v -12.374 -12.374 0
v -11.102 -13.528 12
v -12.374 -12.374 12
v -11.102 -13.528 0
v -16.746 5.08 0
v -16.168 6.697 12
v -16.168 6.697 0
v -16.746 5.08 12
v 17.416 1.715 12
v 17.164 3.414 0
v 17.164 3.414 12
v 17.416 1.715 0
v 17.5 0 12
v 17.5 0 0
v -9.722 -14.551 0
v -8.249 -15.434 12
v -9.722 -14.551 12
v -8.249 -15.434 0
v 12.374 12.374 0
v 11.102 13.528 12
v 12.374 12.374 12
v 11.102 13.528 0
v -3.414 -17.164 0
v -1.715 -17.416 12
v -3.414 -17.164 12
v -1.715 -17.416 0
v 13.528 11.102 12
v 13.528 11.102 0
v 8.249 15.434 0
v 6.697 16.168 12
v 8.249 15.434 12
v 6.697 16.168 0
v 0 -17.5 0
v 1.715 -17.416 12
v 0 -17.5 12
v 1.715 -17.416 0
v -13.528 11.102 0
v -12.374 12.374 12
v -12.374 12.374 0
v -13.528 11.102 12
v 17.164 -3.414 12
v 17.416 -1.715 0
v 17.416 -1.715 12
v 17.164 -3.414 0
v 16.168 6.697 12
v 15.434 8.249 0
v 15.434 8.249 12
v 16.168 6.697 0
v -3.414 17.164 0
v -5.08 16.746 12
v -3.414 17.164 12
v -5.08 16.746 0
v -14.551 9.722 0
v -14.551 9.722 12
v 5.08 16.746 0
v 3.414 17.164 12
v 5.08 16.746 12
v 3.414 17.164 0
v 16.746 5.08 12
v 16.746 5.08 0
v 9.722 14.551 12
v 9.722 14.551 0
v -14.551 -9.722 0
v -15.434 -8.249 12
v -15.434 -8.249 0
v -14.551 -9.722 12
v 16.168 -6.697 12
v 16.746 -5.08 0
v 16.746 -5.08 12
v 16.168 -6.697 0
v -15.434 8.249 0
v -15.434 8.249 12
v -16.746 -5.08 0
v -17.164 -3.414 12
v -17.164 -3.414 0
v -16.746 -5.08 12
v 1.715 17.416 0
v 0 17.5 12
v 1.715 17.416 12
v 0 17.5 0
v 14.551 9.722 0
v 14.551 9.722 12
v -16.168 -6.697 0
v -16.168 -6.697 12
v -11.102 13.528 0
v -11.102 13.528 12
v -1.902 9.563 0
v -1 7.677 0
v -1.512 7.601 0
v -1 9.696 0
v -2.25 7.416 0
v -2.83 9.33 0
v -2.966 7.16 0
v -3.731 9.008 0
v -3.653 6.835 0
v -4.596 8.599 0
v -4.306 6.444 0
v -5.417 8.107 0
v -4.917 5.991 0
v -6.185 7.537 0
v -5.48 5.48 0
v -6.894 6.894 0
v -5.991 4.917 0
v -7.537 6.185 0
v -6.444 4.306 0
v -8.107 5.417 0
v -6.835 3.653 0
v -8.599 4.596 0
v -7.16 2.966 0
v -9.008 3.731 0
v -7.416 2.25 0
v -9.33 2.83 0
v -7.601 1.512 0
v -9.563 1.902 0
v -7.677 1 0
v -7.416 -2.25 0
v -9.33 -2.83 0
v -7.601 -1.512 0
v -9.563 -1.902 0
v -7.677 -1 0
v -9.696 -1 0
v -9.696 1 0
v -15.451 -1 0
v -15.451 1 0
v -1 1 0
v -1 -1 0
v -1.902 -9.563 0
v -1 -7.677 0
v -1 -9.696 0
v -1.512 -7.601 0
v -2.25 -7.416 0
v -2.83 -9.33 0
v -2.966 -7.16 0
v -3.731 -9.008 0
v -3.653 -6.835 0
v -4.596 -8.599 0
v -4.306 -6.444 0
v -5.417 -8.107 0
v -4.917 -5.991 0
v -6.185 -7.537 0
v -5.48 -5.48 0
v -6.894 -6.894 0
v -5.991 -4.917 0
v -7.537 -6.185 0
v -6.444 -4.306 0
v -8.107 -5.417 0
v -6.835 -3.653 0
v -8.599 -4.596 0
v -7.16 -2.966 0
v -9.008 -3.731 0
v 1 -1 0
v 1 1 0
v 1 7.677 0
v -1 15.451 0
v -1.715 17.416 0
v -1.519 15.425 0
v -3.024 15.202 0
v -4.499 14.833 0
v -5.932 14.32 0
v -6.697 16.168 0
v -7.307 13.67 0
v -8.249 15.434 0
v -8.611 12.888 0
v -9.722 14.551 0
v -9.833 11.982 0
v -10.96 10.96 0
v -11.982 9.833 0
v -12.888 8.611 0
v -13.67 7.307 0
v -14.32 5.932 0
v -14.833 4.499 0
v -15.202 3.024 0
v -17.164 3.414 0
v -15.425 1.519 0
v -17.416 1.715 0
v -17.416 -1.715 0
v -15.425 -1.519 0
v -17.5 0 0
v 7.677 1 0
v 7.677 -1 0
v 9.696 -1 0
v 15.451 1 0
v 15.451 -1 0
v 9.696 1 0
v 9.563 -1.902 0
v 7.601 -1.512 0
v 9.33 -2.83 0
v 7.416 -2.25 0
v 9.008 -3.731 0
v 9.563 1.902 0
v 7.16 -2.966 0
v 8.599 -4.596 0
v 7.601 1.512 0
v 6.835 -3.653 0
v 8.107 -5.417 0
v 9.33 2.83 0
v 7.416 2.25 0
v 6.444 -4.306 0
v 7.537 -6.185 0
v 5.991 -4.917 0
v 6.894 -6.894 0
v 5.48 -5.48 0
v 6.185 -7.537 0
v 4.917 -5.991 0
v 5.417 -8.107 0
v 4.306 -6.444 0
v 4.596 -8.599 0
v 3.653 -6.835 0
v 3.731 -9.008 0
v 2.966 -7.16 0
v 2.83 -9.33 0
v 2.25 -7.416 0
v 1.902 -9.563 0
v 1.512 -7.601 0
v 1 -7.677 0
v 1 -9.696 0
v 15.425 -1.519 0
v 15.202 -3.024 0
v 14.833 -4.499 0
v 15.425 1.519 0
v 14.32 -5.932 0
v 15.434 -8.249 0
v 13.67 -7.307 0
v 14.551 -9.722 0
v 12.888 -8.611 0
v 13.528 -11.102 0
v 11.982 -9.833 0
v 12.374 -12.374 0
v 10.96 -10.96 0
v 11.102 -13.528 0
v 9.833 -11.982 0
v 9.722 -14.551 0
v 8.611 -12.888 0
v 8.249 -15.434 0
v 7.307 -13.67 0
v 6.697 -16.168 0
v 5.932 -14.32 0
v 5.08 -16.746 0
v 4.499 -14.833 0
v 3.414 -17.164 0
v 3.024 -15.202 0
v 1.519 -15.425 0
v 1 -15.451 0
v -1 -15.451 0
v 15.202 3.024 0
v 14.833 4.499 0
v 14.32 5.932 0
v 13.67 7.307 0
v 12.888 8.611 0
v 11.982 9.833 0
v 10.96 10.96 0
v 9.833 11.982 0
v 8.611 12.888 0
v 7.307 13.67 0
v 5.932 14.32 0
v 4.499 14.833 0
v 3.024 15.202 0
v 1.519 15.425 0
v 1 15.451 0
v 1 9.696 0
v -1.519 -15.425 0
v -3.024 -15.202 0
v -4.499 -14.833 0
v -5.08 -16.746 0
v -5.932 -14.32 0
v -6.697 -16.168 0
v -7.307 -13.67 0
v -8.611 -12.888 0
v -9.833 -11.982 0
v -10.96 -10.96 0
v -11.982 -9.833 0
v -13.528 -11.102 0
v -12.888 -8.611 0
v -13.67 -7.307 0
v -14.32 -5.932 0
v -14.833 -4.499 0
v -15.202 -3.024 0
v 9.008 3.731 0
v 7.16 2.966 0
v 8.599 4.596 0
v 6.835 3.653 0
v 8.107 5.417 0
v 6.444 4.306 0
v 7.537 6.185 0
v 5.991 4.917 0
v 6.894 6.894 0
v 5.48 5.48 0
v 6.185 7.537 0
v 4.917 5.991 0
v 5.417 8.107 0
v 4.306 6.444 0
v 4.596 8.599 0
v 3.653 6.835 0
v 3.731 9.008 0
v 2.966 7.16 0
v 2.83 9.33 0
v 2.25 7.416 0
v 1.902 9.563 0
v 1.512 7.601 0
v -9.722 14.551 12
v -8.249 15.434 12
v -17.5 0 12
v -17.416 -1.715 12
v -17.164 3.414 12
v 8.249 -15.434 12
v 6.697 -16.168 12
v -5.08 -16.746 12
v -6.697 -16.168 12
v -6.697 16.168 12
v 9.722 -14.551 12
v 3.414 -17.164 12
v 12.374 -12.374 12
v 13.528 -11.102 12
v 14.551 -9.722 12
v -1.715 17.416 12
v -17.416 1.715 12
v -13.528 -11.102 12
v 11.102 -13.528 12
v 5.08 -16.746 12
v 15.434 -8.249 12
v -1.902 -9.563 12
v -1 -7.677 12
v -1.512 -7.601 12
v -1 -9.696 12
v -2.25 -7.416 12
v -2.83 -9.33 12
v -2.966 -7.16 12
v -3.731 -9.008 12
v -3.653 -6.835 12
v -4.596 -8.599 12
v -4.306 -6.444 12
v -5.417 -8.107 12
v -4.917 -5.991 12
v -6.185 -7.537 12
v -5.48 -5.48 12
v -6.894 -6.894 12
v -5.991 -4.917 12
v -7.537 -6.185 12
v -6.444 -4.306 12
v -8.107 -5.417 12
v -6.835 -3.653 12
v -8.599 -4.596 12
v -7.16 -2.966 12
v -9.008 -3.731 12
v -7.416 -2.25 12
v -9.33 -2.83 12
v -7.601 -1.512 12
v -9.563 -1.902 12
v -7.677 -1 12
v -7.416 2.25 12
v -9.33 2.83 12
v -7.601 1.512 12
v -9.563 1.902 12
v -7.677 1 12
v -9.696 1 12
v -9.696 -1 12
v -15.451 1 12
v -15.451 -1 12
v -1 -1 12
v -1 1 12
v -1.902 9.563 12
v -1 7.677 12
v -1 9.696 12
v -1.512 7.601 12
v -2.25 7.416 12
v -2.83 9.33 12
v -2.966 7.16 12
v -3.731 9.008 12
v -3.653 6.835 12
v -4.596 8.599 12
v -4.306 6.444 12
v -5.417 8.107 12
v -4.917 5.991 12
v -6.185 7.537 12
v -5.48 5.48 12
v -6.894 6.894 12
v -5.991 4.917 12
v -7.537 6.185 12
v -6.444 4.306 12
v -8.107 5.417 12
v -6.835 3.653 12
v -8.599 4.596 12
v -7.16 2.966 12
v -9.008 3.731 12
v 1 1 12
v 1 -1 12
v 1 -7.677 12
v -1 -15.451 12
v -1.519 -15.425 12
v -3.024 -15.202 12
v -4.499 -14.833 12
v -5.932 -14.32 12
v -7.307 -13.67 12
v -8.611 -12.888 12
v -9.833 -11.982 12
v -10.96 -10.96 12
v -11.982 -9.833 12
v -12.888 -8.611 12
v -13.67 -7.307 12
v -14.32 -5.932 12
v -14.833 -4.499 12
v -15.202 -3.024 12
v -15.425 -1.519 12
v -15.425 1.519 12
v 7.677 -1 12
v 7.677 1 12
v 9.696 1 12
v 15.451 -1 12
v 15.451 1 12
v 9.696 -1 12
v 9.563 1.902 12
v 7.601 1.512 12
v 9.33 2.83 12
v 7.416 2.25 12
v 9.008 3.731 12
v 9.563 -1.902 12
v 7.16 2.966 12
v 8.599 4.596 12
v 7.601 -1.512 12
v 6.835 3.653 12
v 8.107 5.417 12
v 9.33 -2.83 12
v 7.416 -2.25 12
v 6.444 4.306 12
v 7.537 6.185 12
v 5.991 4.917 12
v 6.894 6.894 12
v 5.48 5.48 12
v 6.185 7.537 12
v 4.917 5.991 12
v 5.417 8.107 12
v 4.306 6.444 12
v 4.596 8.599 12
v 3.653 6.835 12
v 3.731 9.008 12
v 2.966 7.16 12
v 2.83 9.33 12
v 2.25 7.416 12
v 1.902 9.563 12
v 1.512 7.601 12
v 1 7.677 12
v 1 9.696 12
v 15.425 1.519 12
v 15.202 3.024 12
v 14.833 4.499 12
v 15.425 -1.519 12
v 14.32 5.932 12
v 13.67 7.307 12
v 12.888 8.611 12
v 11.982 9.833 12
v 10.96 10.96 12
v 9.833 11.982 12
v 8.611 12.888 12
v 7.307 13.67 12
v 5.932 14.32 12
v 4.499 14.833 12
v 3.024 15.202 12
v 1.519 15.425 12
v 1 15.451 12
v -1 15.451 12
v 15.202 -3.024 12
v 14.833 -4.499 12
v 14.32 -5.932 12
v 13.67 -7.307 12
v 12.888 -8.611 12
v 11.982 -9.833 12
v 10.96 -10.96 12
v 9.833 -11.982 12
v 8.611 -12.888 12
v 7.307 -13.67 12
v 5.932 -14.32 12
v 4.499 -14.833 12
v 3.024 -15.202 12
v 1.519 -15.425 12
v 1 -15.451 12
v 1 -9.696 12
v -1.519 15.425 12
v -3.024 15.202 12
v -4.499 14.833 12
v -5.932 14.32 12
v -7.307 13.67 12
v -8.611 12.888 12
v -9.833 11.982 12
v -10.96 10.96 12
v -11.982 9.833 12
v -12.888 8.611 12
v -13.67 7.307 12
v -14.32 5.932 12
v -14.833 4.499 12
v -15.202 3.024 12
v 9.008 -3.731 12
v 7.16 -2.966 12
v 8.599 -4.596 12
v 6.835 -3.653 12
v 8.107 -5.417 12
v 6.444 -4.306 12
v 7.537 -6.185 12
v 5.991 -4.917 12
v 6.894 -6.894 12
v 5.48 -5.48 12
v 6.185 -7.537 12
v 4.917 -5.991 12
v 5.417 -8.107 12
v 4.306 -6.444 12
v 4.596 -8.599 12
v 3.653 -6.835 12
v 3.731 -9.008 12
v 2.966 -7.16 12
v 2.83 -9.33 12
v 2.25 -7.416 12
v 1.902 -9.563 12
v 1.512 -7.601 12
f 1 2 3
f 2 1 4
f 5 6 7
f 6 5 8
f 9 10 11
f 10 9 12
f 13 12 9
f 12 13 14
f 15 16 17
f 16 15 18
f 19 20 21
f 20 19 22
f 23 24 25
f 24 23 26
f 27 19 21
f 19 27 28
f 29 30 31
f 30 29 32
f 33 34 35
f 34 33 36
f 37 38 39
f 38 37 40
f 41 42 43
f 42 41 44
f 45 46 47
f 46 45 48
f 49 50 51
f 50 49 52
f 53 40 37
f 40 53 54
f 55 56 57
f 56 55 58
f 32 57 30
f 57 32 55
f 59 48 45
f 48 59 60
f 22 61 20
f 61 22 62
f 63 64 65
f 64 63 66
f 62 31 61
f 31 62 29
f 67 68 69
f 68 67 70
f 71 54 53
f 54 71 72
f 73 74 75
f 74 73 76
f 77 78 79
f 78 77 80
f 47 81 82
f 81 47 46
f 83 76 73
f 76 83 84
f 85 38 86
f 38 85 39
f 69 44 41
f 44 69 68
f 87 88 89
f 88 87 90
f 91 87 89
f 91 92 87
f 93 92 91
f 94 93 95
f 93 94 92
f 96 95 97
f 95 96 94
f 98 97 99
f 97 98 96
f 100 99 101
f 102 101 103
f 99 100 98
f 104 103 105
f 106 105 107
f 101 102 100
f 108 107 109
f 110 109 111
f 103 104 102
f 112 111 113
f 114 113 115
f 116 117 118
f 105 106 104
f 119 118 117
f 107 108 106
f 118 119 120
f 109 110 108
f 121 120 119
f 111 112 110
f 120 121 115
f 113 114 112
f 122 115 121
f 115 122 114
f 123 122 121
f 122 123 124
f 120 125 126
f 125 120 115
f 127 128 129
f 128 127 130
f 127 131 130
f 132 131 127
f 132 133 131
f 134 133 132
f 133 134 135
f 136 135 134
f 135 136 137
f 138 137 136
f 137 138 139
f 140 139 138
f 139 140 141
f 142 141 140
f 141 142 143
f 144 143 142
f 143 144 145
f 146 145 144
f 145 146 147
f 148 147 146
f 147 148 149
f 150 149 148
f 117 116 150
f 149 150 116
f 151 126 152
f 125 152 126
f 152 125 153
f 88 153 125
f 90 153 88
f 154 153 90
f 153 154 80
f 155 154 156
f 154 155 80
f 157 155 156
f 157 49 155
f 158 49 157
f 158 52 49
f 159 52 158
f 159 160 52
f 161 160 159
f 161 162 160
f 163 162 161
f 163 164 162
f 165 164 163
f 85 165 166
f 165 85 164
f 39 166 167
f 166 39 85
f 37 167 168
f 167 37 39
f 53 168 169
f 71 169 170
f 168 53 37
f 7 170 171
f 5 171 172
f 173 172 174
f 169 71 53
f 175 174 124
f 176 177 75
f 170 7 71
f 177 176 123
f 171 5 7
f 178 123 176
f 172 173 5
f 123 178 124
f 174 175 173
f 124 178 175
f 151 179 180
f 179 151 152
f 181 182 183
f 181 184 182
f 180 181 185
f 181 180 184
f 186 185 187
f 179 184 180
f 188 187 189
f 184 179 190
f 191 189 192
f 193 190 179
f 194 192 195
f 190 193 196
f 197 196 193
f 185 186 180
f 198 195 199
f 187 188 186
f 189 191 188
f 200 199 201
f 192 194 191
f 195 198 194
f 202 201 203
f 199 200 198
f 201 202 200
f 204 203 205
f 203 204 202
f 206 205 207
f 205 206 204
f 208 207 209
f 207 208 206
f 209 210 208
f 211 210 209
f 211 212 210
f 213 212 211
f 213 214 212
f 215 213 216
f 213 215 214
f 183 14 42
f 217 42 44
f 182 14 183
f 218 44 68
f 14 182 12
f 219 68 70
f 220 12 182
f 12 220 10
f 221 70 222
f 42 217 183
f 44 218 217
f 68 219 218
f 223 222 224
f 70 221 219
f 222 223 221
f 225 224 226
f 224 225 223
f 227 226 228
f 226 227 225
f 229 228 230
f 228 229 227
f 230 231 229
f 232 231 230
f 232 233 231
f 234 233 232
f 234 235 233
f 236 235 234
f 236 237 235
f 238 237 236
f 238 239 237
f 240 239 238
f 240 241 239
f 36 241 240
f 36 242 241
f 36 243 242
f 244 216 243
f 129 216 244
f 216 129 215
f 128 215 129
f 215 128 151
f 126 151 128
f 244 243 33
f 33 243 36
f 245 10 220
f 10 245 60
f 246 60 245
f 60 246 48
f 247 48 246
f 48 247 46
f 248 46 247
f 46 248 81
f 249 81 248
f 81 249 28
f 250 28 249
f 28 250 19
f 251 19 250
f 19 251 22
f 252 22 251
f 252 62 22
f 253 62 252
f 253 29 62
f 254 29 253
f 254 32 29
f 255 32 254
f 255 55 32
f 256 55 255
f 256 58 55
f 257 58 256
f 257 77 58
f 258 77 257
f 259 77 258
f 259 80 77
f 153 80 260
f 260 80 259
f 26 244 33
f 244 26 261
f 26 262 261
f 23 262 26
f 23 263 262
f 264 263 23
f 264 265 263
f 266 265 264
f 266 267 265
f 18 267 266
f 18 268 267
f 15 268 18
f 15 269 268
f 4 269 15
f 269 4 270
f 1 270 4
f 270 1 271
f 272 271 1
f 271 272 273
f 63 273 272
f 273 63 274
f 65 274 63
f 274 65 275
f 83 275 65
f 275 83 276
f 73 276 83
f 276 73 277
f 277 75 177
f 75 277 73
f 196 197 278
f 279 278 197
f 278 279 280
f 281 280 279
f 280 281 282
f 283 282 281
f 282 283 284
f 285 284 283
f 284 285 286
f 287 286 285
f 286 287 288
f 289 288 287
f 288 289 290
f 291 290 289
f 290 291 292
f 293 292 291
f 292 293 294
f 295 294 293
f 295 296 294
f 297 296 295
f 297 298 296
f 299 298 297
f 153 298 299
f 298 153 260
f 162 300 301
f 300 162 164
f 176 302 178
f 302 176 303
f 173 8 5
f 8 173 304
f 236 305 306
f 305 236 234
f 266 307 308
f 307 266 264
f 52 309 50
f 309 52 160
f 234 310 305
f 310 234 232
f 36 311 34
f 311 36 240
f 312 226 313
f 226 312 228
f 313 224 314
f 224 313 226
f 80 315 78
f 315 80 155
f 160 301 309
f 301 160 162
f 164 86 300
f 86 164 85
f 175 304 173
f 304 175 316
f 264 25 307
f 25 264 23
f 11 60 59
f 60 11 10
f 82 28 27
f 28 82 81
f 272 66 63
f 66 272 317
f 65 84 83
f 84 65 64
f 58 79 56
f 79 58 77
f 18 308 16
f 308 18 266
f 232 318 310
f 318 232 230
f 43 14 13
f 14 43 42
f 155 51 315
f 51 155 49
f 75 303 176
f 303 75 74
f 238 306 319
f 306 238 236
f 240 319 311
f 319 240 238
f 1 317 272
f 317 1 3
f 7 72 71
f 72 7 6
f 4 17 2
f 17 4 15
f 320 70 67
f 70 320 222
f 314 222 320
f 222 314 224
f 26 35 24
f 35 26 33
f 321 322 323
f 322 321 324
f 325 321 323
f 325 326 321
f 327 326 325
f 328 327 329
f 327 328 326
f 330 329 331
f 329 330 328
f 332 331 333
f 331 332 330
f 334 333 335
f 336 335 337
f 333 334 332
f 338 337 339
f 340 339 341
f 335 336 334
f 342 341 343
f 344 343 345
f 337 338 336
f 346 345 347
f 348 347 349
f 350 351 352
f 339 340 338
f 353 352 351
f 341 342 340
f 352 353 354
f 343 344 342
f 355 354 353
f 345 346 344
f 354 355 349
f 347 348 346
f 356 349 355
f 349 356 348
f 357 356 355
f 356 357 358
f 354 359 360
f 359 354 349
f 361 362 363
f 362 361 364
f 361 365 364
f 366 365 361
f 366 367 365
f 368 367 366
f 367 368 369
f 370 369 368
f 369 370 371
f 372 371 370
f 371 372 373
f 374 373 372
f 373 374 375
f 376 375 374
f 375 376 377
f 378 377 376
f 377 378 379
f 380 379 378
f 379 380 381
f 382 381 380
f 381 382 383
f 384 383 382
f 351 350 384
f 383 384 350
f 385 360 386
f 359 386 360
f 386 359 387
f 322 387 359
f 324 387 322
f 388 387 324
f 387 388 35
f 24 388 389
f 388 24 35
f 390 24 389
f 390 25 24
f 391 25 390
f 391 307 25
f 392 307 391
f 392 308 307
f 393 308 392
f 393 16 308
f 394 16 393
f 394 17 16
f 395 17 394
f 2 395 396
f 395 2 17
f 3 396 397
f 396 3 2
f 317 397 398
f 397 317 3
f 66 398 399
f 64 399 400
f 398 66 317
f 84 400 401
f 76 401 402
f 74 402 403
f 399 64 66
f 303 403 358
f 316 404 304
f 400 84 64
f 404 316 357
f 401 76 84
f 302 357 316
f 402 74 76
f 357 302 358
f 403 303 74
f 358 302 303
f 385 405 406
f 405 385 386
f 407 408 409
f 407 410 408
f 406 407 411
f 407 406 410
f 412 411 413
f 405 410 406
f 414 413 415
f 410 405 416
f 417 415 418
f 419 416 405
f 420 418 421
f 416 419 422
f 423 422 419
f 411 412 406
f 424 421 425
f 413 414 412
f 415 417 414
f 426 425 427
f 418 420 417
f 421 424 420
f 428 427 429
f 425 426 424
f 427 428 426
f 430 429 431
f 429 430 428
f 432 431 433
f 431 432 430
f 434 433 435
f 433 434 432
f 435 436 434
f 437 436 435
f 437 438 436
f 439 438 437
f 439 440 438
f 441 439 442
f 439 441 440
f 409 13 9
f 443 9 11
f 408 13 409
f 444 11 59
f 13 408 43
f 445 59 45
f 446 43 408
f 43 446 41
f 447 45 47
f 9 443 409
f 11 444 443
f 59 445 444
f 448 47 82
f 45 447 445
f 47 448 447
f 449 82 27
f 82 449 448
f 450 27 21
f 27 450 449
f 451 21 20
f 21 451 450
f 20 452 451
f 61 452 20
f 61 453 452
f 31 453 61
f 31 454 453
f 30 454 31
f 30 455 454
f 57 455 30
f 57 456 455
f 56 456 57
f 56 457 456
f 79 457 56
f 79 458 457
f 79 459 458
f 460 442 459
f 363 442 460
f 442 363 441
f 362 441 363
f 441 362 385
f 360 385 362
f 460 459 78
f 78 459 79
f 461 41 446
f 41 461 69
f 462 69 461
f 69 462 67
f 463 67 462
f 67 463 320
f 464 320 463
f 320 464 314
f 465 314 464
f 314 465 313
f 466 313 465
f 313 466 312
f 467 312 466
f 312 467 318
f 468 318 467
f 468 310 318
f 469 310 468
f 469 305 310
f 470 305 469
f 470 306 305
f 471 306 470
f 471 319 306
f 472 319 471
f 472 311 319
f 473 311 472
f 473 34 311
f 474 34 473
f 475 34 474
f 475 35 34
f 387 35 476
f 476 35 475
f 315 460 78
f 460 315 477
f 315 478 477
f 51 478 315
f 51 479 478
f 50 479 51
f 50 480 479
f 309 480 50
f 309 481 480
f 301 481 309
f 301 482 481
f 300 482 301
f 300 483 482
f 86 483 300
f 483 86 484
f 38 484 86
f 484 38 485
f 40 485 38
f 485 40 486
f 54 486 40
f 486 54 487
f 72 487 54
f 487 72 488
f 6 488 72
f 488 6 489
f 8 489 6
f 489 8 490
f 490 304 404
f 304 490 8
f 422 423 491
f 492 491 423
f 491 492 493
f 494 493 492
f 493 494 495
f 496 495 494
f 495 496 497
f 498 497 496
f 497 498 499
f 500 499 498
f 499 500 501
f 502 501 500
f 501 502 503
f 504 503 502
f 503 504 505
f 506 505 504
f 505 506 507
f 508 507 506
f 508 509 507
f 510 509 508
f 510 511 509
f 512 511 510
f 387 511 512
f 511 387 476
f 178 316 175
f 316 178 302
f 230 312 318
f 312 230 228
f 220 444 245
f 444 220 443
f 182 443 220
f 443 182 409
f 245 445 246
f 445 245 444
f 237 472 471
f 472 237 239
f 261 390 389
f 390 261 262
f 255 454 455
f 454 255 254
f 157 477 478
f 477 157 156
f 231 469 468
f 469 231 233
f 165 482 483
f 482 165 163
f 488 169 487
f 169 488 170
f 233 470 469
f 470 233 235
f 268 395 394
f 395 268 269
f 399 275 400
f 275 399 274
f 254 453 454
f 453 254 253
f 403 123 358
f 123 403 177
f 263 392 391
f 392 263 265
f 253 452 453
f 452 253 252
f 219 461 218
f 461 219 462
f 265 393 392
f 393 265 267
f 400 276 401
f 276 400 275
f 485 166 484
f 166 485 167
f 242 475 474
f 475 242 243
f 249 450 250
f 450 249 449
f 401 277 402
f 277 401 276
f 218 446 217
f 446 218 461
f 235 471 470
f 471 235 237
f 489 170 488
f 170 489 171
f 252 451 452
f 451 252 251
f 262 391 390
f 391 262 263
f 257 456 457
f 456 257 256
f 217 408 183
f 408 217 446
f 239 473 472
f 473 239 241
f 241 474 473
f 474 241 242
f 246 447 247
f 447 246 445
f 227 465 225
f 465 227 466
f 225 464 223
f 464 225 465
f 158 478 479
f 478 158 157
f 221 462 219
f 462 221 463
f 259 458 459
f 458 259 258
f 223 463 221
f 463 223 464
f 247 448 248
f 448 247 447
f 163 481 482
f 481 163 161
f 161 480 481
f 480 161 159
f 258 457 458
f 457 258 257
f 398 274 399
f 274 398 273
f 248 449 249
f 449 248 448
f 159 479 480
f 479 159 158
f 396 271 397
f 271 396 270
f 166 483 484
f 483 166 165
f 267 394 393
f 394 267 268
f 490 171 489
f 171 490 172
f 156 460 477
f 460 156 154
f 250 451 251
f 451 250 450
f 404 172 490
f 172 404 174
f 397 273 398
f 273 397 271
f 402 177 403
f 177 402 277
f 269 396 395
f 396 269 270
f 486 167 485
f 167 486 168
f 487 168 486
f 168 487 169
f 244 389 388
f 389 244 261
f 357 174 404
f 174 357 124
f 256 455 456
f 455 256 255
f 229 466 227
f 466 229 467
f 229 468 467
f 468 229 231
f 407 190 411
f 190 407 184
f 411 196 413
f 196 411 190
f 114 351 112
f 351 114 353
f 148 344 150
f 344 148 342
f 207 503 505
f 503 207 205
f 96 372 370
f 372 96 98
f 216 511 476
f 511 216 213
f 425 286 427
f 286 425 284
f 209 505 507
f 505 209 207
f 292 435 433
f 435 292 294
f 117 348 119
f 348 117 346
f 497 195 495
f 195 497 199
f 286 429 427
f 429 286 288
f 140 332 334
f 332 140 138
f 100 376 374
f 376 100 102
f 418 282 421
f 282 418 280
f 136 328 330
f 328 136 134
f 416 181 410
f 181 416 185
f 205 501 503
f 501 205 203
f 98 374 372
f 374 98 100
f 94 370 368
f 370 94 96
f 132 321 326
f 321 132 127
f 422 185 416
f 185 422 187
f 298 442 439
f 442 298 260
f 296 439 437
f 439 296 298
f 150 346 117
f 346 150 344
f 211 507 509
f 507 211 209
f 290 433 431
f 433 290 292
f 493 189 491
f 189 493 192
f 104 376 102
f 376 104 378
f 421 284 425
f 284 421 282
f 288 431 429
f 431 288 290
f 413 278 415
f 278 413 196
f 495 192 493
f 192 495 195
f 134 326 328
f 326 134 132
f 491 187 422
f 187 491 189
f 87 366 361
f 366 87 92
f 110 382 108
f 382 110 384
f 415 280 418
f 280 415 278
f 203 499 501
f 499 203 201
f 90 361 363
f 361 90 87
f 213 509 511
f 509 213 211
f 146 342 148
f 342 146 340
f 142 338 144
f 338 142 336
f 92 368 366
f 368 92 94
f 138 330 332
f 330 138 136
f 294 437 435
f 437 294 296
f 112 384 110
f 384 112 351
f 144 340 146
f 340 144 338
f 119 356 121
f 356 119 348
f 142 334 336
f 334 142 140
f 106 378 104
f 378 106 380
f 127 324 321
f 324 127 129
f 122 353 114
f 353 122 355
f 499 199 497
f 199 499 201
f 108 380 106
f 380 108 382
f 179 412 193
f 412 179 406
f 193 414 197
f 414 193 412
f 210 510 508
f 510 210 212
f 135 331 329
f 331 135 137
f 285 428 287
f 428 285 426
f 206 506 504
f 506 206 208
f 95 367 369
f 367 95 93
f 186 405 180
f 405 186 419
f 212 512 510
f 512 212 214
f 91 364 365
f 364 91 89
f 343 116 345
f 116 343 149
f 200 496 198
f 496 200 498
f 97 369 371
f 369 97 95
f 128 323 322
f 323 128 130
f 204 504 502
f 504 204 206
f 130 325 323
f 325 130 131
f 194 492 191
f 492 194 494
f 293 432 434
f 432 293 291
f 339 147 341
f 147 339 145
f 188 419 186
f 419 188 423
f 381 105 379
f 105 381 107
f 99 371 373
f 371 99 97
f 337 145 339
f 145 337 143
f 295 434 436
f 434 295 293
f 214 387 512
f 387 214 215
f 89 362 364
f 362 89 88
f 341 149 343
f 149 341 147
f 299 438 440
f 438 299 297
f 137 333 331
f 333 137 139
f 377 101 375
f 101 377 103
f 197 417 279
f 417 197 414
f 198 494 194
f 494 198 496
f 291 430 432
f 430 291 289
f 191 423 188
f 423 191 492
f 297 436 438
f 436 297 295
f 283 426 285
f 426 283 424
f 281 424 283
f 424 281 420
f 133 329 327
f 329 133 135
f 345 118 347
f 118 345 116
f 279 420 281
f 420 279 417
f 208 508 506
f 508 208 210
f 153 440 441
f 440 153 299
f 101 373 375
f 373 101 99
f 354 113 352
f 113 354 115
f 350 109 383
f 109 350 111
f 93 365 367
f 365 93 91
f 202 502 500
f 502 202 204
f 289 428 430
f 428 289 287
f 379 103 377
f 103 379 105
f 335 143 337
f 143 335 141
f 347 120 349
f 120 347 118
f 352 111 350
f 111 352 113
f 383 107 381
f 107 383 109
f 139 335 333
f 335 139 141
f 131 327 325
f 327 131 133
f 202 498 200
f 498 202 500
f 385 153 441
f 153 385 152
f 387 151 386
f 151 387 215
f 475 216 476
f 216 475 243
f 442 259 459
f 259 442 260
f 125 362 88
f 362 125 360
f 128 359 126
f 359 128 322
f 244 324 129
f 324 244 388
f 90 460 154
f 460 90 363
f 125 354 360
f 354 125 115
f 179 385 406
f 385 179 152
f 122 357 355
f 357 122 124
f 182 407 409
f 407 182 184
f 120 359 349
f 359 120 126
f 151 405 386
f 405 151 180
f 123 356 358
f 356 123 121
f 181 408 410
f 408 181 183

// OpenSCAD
r = 17.5;
h1 = 12;
w = 2;
eps = 0.1;

$fn = 64;


module Spacer(h) {
    difference() {
        cylinder(h, r=r);
        translate( [ 0, 0, -eps ] ) {
            cylinder( h+2*eps, r=r-w );
        }
    }

    difference() {
        cylinder(h, r=r/2+w/2);
        translate( [ 0, 0, -eps ] ) {
            cylinder( h+2*eps, r=r/2-w/2 );
        }
    }
    
    translate( [ -w/2, -r+w/2, 0 ]) {
        cube([w, 2*r-w, h ]);
    }

    translate( [ -r+w/2, -w/2, 0 ]) {
        cube([2*r-w, w, h ]);
    }
}

Spacer(h1);

// translate([r*3, 0, 0]) {
//     Spacer(h2);
// }
